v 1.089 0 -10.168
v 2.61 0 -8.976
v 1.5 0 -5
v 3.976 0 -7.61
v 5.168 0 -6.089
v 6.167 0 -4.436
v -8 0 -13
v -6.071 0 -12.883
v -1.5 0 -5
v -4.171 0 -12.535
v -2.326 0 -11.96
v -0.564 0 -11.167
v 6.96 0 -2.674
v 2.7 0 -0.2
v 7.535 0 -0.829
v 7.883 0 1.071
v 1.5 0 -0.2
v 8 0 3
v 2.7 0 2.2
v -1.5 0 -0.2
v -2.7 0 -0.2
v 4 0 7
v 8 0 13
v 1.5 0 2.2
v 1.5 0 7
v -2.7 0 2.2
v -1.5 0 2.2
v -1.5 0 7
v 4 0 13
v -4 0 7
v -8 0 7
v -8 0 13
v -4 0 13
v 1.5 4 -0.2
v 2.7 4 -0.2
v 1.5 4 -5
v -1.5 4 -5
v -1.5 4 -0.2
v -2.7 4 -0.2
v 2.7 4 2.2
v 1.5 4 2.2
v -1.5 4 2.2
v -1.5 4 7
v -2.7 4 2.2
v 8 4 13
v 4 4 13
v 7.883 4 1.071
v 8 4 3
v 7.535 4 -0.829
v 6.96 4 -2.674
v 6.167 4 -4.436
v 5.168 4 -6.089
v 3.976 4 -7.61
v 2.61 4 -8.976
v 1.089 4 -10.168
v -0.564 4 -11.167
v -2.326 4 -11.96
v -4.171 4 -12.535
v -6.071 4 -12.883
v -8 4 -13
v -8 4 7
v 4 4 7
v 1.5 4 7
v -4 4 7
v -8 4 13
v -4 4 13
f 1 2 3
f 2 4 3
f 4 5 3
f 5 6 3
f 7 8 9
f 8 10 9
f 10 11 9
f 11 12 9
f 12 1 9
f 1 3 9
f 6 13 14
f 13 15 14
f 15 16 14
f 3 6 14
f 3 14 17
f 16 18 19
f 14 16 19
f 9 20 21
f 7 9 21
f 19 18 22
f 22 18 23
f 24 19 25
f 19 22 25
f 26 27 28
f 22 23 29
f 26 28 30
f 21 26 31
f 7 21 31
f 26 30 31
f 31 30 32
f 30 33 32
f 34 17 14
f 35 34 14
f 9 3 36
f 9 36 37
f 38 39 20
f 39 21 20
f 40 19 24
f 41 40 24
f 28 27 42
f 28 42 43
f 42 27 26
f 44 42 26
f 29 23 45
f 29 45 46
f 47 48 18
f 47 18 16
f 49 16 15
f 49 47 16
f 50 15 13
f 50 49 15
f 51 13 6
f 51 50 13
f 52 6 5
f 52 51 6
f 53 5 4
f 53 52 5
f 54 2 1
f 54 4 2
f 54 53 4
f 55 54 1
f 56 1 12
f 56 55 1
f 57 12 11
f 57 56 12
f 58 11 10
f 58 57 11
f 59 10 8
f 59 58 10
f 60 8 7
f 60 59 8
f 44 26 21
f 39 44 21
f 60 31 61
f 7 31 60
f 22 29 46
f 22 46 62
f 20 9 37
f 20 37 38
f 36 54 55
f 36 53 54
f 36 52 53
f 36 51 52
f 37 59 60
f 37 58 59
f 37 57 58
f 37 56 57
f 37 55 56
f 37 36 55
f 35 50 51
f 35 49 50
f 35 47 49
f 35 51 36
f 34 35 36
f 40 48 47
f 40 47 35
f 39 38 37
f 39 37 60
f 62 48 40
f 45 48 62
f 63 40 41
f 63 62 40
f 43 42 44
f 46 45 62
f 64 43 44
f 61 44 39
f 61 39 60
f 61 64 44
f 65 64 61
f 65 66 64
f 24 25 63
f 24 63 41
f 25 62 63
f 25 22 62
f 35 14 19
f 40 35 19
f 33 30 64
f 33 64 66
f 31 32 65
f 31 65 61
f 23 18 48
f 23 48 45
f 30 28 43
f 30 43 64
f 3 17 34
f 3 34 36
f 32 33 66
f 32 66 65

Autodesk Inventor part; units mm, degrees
ref_plane "YZ Plane" through (0, 0, 0) normal (1, 0, 0) x (0, 1, 0)
ref_plane "XZ Plane" through (0, 0, 0) normal (0, 1, 0) x (-1, 0, 0)
ref_plane "XY Plane" through (0, 0, 0) normal (0, 0, 1) x (1, 0, 0)
sketch "Sketch1" plane through (0, 0, 0) normal (0, 1, 0) x (-1, 0, 0)
  line L0 (8, 13) -> (8, 7)
  line L1 (8, 7) -> (8, 7)
  line L2 (8, 7) -> (8, -13)
  line L3 (8, -13) -> (-8, -13)
  line L4 (-8, -13) -> (-8, 13)
  line L5 (-8, 13) -> (-4, 13)
  line L6 (-4, 13) -> (-4, 7)
  line L7 (-4, 7) -> (4, 7)
  line L8 (4, 7) -> (4, 13)
  line L9 (4, 13) -> (8, 13)
  line L10 (8, -13) -> (-8, 13) construction
  line L11 (1.5, 7) -> (-1.5, 7)
  line L12 (-1.5, 7) -> (-1.5, -5)
  line L13 (-1.5, -5) -> (1.5, -5)
  line L14 (1.5, -5) -> (1.5, 7)
  line L15 (2.7, -0.2) -> (-2.7, -0.2)
  line L16 (-2.7, -0.2) -> (-2.7, 2.2)
  line L17 (-2.7, 2.2) -> (2.7, 2.2)
  line L18 (2.7, 2.2) -> (2.7, -0.2)
  point P0 (0, 0)
  point P1 (0, 0)
  point P2 (0, 2.2)
  point P3 (0, -5)
  point P4 (-2.7, 1)
  point P5 (-1.5, 1)
  point P6 (0, 7)
  point P7 (1.5, 2.2)
  point P8 (1.5, -0.2)
  point P9 (-1.5, -0.2)
  point P10 (-1.5, 2.2)
  dimension "d0" = 6
  dimension "d1" = 4
  dimension "d3" = 0
  dimension "d4" = 4
  dimension "d5" = 20
  dimension "d10" = 8
  dimension "d11" = 3
  dimension "d12" = 12
  dimension "d13" = 5.4
  dimension "d14" = 2.4
extrude "Extrusion1" add sketch "Sketch1" along normal blind 4 contours L0 L2 L3 L4 L5 L6 L7 L12 L17 L16 L15 L13 L14 L18 L8 L9
fillet "Fillet1" radius 16 1 edges at (8, 2, -13)
properties part number "Lever" material "MDF Medium Density Fiberboard"
